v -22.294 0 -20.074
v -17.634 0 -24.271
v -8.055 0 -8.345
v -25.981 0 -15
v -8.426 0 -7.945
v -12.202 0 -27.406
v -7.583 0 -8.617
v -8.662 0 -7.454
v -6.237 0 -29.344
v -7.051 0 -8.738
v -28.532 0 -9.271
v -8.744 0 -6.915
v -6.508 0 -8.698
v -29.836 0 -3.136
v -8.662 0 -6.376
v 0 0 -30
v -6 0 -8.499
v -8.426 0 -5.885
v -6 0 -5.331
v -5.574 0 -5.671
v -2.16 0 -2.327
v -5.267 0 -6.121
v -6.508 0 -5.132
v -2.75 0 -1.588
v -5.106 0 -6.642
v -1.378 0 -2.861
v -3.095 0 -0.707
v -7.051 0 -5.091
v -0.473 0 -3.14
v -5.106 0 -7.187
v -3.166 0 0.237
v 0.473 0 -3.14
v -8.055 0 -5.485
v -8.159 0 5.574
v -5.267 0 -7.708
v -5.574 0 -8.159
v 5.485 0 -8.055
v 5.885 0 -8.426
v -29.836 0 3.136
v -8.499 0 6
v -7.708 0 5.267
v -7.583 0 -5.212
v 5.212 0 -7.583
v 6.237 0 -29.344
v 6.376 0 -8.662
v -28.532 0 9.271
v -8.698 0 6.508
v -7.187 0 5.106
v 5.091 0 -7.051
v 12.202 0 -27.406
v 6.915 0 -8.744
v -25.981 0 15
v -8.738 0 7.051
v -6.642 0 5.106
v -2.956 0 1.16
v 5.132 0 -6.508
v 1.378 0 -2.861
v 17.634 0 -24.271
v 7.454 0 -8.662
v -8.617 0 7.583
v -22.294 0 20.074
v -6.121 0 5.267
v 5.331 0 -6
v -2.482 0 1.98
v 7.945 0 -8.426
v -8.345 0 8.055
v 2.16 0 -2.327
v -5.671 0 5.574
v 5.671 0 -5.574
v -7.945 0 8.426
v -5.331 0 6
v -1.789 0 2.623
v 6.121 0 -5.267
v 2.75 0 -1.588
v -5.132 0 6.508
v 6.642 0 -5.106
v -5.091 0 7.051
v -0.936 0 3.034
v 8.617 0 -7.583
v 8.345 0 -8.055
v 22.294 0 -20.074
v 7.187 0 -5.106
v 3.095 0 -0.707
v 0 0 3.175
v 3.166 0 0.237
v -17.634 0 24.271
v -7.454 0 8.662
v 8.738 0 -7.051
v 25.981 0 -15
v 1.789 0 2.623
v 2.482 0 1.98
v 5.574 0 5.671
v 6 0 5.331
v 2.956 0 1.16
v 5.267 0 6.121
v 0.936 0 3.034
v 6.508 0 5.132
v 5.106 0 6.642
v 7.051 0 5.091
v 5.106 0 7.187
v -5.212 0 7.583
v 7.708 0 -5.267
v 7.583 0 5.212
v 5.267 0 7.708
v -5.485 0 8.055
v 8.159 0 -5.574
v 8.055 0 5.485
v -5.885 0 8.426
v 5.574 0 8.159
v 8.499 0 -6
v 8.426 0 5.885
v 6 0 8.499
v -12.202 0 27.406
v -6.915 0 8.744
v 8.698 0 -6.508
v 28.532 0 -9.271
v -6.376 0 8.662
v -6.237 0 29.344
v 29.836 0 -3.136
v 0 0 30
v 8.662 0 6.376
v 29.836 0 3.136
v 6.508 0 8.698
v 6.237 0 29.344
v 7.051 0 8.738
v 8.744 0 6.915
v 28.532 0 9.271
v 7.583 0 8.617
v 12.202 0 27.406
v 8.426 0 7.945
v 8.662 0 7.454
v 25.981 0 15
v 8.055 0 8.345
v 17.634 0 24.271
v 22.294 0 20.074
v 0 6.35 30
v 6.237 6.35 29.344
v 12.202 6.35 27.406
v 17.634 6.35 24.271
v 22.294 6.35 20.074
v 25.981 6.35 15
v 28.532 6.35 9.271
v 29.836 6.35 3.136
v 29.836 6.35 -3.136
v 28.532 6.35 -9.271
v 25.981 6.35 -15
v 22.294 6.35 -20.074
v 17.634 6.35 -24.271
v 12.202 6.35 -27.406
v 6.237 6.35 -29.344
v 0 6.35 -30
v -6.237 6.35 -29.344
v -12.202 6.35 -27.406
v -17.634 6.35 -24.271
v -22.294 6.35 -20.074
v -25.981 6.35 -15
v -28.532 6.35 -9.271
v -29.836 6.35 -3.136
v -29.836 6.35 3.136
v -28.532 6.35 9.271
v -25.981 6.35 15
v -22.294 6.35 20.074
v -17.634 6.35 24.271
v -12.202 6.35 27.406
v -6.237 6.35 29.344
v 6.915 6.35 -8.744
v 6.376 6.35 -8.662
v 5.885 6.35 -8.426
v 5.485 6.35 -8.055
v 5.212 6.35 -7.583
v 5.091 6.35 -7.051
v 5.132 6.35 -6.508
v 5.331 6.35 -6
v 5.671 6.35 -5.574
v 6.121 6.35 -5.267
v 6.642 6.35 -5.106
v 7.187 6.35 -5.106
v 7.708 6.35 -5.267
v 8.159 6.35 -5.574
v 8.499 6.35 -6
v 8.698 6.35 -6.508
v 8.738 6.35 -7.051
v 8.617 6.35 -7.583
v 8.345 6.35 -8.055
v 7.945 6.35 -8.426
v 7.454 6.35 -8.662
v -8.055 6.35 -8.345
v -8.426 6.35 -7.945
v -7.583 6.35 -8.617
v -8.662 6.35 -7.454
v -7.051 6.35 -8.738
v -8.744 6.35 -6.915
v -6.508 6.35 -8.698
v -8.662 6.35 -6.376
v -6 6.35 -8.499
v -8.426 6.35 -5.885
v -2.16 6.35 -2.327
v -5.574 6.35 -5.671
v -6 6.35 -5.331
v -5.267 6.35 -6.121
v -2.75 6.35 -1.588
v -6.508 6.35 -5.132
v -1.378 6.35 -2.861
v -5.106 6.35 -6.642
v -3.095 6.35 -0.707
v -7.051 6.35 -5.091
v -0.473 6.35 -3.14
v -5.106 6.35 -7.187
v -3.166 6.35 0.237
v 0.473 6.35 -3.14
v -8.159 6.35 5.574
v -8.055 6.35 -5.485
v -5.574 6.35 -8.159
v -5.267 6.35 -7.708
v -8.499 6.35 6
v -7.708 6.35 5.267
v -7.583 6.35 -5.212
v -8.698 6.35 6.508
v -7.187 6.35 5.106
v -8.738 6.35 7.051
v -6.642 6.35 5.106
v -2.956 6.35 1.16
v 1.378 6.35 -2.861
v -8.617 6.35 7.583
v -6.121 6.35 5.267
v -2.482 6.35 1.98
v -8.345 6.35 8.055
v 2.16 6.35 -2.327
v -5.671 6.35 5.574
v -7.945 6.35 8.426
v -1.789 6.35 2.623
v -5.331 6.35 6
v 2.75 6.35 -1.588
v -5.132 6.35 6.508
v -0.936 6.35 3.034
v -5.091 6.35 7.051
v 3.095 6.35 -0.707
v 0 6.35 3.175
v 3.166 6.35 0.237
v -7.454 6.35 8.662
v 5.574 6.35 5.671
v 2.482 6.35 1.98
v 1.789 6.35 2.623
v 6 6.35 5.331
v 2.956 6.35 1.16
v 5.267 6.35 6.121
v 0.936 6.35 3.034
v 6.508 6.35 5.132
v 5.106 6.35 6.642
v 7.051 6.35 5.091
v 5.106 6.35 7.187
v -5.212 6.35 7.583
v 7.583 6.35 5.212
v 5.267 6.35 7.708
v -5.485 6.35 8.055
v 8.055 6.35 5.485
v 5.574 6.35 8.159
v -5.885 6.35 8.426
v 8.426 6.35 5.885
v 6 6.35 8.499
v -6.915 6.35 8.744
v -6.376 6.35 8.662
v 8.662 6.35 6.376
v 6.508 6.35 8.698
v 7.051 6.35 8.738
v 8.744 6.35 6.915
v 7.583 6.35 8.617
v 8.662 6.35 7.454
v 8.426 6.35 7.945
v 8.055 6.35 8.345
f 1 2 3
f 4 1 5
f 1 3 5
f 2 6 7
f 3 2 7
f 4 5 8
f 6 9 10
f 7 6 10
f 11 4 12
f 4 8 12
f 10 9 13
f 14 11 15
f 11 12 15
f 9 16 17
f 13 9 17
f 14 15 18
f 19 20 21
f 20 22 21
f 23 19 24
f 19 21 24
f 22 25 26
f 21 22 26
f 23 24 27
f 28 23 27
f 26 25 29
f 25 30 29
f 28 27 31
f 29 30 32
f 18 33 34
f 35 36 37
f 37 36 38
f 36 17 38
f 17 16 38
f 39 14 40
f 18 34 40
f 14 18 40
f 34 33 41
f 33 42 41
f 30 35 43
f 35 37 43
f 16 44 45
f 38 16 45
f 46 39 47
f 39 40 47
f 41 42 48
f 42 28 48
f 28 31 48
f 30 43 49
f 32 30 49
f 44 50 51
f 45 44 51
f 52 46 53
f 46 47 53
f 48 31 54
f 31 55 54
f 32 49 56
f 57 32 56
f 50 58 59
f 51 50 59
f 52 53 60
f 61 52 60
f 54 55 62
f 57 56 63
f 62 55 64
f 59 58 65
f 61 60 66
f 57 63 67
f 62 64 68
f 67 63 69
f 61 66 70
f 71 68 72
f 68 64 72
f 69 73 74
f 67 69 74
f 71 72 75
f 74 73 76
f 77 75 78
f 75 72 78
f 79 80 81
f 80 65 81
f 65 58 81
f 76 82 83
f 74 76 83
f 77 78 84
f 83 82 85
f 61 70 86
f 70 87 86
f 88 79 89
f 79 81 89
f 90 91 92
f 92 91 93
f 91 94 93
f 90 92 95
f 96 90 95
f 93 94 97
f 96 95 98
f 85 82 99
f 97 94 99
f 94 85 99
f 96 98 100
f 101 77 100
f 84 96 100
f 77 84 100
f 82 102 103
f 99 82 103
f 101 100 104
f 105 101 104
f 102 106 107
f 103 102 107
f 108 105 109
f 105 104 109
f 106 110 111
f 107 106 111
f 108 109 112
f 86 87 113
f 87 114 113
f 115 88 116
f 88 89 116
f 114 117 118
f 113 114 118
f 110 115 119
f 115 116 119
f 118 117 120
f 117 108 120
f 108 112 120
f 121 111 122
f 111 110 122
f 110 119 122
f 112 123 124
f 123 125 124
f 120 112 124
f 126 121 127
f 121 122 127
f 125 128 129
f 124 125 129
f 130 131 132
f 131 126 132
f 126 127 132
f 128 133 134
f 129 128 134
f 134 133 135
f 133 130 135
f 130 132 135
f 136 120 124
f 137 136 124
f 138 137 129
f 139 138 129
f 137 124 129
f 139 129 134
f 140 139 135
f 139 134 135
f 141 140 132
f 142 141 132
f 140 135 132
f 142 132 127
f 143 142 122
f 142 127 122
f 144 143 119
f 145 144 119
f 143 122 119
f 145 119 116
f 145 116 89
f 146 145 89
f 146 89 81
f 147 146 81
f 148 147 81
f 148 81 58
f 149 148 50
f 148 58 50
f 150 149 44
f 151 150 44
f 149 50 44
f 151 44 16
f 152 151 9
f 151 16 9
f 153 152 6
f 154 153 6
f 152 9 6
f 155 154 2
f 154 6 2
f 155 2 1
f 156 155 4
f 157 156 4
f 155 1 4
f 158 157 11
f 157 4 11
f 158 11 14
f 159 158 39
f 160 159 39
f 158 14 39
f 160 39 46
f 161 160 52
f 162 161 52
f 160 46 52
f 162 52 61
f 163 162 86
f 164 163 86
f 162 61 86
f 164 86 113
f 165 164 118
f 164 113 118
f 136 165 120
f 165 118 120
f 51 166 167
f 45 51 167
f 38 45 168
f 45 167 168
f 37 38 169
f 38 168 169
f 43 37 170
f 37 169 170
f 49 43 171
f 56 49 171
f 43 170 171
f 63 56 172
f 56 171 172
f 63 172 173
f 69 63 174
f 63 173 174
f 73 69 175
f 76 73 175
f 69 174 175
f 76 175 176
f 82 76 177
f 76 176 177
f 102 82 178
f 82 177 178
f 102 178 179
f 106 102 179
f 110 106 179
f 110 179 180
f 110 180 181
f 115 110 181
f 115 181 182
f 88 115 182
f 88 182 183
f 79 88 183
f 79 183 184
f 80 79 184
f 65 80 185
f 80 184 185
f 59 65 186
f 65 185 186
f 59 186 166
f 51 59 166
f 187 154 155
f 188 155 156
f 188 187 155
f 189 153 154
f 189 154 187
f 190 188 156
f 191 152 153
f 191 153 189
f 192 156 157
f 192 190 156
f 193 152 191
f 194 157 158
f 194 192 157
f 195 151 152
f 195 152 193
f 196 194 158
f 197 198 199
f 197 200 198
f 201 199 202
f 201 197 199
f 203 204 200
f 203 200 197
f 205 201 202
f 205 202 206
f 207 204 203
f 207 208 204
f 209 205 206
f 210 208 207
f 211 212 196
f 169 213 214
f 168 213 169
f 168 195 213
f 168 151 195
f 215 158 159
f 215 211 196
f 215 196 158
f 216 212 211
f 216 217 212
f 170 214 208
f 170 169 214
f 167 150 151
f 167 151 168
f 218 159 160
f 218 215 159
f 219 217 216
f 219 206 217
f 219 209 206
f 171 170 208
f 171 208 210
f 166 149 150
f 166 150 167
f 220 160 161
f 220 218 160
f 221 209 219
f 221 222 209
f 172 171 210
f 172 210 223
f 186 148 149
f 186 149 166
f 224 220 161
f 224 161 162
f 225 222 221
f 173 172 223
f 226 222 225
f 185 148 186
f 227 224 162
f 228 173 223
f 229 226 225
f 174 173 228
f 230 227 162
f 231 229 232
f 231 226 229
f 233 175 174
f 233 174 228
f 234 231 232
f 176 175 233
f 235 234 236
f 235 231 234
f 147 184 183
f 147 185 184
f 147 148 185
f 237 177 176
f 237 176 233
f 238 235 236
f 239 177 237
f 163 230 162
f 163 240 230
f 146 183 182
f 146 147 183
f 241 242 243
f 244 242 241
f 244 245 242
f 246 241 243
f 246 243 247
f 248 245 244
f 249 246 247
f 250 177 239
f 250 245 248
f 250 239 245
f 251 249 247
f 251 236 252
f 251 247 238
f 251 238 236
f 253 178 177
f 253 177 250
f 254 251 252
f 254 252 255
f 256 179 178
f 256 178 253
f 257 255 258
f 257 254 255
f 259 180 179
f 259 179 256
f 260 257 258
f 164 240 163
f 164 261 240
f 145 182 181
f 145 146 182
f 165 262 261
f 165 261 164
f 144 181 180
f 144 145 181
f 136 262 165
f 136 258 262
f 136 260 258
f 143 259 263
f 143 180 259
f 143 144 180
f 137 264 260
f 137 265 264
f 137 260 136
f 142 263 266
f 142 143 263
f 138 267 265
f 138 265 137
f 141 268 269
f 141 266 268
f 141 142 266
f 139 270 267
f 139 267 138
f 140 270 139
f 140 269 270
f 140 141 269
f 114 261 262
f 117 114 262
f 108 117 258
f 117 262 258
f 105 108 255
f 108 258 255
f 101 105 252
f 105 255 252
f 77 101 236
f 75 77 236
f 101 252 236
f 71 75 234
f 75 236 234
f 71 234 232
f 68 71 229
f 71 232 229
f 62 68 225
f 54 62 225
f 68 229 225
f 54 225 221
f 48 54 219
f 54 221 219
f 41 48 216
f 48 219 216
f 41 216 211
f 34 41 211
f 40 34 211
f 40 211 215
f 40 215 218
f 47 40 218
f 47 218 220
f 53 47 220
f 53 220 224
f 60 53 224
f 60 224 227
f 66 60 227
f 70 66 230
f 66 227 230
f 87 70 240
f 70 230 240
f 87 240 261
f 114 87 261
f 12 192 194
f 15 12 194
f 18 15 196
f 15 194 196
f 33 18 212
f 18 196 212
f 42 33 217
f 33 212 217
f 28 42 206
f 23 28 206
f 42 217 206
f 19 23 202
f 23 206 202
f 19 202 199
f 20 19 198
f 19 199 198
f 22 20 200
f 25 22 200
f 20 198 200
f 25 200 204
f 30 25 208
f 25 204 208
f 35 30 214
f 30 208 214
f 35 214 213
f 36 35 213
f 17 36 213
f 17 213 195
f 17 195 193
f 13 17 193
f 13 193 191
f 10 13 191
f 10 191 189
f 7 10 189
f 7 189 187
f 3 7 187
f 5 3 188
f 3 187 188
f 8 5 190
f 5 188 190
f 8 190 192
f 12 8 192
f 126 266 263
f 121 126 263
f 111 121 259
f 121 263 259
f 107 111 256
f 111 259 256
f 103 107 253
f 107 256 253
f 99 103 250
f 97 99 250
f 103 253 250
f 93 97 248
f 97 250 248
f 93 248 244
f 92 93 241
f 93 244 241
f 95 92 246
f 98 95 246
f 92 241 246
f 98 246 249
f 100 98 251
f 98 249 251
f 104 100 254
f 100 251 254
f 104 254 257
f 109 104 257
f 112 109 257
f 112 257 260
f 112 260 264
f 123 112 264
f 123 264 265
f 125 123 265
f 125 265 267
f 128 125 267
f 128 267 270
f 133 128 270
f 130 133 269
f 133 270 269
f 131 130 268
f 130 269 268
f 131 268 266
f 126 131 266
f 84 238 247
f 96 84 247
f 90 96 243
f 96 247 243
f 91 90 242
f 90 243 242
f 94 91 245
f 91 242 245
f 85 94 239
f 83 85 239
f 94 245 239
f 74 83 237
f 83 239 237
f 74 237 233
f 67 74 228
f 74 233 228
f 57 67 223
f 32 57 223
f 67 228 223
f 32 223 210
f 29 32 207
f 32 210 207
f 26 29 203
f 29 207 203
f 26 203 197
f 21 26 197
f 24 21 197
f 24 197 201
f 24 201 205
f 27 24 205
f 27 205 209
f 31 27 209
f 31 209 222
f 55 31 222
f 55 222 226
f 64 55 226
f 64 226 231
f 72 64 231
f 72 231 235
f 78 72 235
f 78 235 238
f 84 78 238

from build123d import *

# Parameters (mm, degrees)
ESQUISSE1_R             = 30
BOSS_EXTRU_1_DEPTH      = 6.35
ENL_V_MAT_EXTRU_1_REACH = 44.899
ESQUISSE2_R             = 3.175
SKETCH1_R               = 1.8288
CUT_EXTRUDE1_DEPTH      = 6.35
CIRPATTERN1_COUNT       = 4


with BuildPart() as part:
    # Esquisse1 → Boss.-Extru.1 (new body)
    with BuildSketch(Plane(origin=(0, 0, 0), x_dir=(1, 0, 0), z_dir=(0, 1, 0))):
        with Locations(Location((0, 0, 0), (0, 0, 270))):
            Circle(ESQUISSE1_R)
    extrude(amount=BOSS_EXTRU_1_DEPTH)

    # Esquisse2 → Enlèv. mat.-Extru.1 (cut, up to next)
    with BuildSketch(Plane(origin=(0, 6.35, 0), x_dir=(1, 0, 0), z_dir=(0, 1, 0)), mode=Mode.PRIVATE) as enl_v_mat_extru_1_sk1:
        with Locations(Location((0, 0, 0), (0, 0, 270))):
            Circle(ESQUISSE2_R)
    enl_v_mat_extru_1_tool1 = extrude(enl_v_mat_extru_1_sk1.sketch, amount=-ENL_V_MAT_EXTRU_1_REACH, mode=Mode.PRIVATE) & part.part
    add(enl_v_mat_extru_1_tool1.solids().sort_by_distance((0, 6.35, 0))[0], mode=Mode.SUBTRACT)

    # Sketch1 → Cut-Extrude1 (cut)
    with BuildSketch(Plane(origin=(0, 6.35, 0), x_dir=(1, 0, 0), z_dir=(0, 1, 0))):
        with Locations(Location((-6.914797213, -6.914797213, 0), (0, 0, 270))):
            Circle(SKETCH1_R)
    cut_extrude1 = extrude(amount=-CUT_EXTRUDE1_DEPTH, mode=Mode.SUBTRACT)

    # CirPattern1: Cut-Extrude1 ×4 about axis
    cirpattern1_axis = Axis((0, 0, 0), (0, 1, 0))
    for i in range(1, CIRPATTERN1_COUNT):
        add(cut_extrude1.rotate(cirpattern1_axis, i * 360 / CIRPATTERN1_COUNT), mode=Mode.SUBTRACT)


solid = part.part
